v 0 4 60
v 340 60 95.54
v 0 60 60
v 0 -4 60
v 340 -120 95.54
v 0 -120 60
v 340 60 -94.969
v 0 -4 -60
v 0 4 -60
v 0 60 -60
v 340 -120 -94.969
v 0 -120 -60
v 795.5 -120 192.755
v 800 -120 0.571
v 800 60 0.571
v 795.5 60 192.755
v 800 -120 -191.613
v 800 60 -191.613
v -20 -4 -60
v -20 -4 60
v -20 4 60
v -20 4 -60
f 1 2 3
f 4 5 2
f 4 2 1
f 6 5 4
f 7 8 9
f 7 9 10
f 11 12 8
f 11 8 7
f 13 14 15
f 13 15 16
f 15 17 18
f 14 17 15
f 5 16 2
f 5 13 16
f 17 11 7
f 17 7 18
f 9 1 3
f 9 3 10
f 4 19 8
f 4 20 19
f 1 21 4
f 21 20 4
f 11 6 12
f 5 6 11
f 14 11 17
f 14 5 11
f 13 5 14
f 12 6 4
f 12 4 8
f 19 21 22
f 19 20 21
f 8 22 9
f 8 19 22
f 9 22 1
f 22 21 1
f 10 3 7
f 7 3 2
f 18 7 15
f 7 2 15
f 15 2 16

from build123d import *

# Parameters (mm, degrees)
F1_DEPTH = 4
F2_DEPTH = 60
F3_DEPTH = 60
F4_W     = 20
F4_H     = 60
F5_DEPTH = 4


with BuildPart() as f1:
    # F0 (on Front) → F1 (new body, symmetric)
    with BuildSketch(Plane.XZ):
        with BuildLine():
            Line((0, 0.0707786067), (0, 0))
            Line((0, 0), (0, -60))
            Line((0, -60), (340, -94.9689))
            Line((340, -94.9689), (800, -191.6132215183))
            Line((800, -191.6132215183), (800, 0.5707784817))
            Line((800, 0.5707784817), (0.5003536116, 0.5707784817))
            ThreePointArc((0.5003536116, 0.5707784817), (0.1465716521, 0.4244569958), (0, 0.0707786067))
        make_face()
        with BuildLine():
            Line((0, 60), (0, 0.0707786067))
            ThreePointArc((0, 0.0707786067), (0.1465716521, 0.4244569958), (0.5003536116, 0.5707784817))
            Line((0.5003536116, 0.5707784817), (800, 0.5707784817))
            Line((800, 0.5707784817), (795.5003536116, 192.755164923))
            Line((795.5003536116, 192.755164923), (340, 95.539677511))
            Line((340, 95.539677511), (0, 60))
        make_face()
    extrude(amount=F1_DEPTH, both=True)

    # F0 (on Front) → F2 (join, symmetric)
    with BuildSketch(Plane.XZ):
        with BuildLine():
            Line((0, 0.0707786067), (0, 0))
            Line((0, 0), (0, -60))
            Line((0, -60), (340, -94.9689))
            Line((340, -94.9689), (800, -191.6132215183))
            Line((800, -191.6132215183), (800, 0.5707784817))
            Line((800, 0.5707784817), (0.5003536116, 0.5707784817))
            ThreePointArc((0.5003536116, 0.5707784817), (0.1465716521, 0.4244569958), (0, 0.0707786067))
        make_face()
        with BuildLine():
            Line((0, 60), (0, 0.0707786067))
            ThreePointArc((0, 0.0707786067), (0.1465716521, 0.4244569958), (0.5003536116, 0.5707784817))
            Line((0.5003536116, 0.5707784817), (800, 0.5707784817))
            Line((800, 0.5707784817), (795.5003536116, 192.755164923))
            Line((795.5003536116, 192.755164923), (340, 95.539677511))
            Line((340, 95.539677511), (0, 60))
        make_face()
    extrude(amount=F2_DEPTH, both=True)

    # F3 (add, symmetric): a face of the model
    f3_faces = [f1.faces().sort_by_distance(p)[0] for p in [
        (477.468484718, -60, 0.2503652073),
    ]]
    extrude(f3_faces, amount=F3_DEPTH, both=True)

    # F4 (on Front) → F5 (join, symmetric)
    with BuildSketch(Plane.XZ):
        with Locations((-10, -30)):
            Rectangle(F4_W, F4_H)
        with Locations((-10, 30)):
            Rectangle(F4_W, F4_H)
    extrude(amount=F5_DEPTH, both=True)


solid = f1.part
